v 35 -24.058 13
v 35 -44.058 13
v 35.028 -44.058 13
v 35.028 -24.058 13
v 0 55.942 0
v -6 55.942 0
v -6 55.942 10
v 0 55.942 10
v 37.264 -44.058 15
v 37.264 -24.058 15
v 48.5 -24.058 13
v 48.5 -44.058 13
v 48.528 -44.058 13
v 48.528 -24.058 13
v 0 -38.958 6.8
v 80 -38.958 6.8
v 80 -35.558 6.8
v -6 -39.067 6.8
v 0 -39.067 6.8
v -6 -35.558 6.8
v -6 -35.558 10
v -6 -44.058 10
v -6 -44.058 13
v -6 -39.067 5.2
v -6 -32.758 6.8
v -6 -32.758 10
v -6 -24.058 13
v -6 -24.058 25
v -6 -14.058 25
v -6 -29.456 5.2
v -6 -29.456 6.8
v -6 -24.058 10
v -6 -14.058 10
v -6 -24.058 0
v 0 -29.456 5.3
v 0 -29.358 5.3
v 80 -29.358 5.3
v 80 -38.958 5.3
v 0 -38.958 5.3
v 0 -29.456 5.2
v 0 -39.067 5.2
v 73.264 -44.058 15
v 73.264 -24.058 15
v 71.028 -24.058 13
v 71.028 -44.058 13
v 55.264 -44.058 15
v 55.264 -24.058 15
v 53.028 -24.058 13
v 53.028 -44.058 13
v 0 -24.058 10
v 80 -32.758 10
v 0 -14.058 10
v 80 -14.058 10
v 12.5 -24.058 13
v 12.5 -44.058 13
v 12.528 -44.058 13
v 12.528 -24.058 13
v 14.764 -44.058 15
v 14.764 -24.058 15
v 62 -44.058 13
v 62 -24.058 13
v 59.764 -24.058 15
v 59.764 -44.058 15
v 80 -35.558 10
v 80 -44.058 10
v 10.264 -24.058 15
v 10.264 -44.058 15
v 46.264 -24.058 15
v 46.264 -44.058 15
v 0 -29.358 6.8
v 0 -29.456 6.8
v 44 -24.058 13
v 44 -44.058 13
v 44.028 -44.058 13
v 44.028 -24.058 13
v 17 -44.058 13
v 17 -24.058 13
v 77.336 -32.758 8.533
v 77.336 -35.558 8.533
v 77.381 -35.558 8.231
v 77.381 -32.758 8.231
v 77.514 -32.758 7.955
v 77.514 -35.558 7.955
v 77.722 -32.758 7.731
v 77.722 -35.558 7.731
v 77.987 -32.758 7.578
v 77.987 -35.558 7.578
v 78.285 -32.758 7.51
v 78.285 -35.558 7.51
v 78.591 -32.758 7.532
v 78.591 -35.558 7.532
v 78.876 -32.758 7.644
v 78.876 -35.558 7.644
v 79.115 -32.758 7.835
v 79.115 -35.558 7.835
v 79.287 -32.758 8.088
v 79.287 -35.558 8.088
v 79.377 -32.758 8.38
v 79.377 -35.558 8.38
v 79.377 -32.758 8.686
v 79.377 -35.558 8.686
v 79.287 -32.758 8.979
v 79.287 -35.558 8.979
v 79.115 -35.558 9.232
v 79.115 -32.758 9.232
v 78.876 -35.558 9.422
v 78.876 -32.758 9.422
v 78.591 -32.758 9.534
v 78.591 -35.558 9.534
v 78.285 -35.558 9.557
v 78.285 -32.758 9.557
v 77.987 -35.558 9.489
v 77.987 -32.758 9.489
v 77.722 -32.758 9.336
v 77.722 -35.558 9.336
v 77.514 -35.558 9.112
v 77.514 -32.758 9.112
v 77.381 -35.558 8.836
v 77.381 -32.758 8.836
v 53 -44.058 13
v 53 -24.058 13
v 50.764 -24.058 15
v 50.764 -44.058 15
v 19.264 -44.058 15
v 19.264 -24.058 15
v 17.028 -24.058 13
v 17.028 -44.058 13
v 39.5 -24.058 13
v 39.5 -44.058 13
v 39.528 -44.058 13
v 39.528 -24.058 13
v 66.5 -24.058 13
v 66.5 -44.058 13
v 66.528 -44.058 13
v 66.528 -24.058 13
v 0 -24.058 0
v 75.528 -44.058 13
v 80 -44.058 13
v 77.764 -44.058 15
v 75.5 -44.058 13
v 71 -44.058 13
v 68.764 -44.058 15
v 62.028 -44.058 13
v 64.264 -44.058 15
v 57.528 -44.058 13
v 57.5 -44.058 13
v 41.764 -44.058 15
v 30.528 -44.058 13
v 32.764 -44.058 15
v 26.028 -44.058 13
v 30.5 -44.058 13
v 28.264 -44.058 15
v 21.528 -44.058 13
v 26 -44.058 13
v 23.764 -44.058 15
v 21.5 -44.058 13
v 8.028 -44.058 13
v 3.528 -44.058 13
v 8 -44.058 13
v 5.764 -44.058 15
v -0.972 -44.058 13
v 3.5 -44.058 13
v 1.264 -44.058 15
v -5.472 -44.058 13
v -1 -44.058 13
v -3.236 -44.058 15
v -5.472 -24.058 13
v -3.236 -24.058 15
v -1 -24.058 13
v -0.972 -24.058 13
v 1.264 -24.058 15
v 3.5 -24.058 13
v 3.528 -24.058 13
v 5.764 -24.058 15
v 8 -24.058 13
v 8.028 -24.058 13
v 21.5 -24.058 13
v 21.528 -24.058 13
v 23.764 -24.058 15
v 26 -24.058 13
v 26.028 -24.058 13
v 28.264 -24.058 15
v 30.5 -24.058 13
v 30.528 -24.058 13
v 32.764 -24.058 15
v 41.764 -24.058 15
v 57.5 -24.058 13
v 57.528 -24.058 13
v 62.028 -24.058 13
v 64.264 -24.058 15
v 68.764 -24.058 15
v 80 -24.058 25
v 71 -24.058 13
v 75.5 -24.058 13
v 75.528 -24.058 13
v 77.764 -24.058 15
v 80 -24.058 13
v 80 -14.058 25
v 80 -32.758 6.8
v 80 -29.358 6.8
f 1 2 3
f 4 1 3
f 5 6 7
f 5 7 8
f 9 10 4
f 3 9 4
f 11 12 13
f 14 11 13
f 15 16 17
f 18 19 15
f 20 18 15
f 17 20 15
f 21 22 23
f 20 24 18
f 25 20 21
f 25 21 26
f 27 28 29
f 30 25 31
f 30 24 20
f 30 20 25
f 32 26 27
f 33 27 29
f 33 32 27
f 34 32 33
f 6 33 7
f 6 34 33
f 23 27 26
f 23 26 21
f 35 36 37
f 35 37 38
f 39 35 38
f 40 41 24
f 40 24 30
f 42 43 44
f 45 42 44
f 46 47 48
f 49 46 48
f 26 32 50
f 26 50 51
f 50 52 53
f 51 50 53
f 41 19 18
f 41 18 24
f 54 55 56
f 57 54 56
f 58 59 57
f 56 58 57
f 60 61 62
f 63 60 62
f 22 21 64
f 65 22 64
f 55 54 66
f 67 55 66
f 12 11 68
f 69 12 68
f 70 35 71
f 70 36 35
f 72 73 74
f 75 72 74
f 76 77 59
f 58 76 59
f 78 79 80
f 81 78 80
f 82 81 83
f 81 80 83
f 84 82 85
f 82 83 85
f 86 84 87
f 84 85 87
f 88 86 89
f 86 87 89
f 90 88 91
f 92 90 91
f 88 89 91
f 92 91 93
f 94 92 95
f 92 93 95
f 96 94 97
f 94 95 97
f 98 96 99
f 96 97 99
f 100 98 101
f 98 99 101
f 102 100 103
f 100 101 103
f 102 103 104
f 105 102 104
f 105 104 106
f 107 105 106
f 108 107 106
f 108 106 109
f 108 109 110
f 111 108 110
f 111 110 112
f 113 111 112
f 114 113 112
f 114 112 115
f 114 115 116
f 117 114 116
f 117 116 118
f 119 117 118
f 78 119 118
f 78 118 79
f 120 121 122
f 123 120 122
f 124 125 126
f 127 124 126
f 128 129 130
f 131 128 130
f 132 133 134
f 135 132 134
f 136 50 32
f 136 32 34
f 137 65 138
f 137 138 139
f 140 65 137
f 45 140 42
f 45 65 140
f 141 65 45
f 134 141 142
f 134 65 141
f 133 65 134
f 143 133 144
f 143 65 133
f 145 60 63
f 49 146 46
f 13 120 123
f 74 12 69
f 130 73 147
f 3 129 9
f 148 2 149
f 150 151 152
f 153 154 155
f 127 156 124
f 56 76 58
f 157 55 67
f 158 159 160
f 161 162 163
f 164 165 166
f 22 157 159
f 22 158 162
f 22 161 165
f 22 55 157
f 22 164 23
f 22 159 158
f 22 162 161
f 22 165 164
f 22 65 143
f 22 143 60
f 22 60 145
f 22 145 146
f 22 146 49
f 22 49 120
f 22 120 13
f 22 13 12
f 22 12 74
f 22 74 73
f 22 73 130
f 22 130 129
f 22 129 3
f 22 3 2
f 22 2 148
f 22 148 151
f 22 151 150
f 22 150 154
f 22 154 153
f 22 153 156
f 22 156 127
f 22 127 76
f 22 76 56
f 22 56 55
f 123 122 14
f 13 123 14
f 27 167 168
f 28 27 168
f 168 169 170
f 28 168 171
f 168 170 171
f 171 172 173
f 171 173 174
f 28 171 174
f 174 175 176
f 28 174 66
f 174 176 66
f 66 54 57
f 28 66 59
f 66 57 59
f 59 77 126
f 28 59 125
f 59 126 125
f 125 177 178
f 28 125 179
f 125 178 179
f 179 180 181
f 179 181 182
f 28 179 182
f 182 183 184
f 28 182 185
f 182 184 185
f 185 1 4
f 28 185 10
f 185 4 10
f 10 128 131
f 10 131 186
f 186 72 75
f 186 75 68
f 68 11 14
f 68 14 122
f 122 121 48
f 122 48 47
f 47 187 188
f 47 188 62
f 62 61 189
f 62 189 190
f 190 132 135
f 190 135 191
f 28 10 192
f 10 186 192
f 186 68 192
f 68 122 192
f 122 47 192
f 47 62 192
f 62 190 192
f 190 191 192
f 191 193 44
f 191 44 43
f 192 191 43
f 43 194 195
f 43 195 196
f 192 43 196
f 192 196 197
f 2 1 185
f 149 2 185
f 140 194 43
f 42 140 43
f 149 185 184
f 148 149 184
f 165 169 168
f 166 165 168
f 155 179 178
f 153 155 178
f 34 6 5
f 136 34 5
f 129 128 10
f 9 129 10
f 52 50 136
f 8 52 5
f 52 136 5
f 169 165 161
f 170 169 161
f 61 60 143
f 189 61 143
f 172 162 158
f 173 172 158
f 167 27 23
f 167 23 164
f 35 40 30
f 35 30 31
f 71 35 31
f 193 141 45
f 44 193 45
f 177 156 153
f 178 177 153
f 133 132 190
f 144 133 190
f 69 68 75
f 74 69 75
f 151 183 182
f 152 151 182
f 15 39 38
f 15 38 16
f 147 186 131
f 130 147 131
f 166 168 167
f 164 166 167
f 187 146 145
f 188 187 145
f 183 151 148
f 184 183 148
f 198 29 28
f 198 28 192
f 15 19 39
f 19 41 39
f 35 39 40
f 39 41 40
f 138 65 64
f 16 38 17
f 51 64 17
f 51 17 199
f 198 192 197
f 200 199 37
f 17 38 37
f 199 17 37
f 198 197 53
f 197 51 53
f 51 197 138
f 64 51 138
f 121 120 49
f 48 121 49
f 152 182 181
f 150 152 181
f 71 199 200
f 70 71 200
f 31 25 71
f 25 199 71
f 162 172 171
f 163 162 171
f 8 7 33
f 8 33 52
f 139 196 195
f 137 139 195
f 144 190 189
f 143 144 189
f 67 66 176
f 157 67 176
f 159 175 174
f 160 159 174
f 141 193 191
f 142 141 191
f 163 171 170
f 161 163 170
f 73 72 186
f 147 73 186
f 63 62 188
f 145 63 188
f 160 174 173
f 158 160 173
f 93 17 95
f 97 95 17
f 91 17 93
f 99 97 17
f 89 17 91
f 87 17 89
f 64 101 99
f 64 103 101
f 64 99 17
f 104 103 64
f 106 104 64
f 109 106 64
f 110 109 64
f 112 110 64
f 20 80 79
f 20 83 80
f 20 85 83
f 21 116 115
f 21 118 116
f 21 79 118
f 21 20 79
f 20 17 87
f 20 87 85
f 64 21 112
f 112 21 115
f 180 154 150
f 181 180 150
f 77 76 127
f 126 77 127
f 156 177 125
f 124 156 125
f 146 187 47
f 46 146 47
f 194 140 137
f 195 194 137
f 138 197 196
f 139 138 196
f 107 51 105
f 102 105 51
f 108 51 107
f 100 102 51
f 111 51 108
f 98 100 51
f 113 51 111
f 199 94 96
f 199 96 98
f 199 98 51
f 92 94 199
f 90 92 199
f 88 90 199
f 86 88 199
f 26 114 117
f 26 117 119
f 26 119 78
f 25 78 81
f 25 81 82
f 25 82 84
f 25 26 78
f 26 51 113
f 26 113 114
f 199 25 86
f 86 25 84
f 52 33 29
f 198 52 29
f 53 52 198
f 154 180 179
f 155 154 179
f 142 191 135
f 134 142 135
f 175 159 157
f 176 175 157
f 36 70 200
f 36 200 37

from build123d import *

# Parameters (mm, degrees)
SKETCH4_W           = 6
SKETCH4_H           = 100
BOSS_EXTRUDE2_DEPTH = 10
BOSS_EXTRUDE3_DEPTH = 80
SKETCH6_W           = 86
SKETCH6_H           = 20
BOSS_EXTRUDE4_DEPTH = 3
SKETCH7_R           = 1.026650489
CUT_EXTRUDE2_DEPTH  = 10
BOSS_EXTRUDE6_DEPTH = 20
CUT_EXTRUDE3_DEPTH  = 10
SKETCH11_W          = 86
SKETCH11_H          = 10
BOSS_EXTRUDE7_DEPTH = 15


with BuildPart() as part:
    # Sketch4 → Boss-Extrude2 (new body)
    with BuildSketch(Plane.XY):
        with Locations((-3, 5.941704036)):
            Rectangle(SKETCH4_W, SKETCH4_H)
    extrude(amount=BOSS_EXTRUDE2_DEPTH)

    # Sketch5 → Boss-Extrude3 (add)
    with BuildSketch(Plane(origin=(0, 0, 0), x_dir=(0, 0, -1), z_dir=(1, 0, 0))):
        Polygon((-10, -32.758295964), (-6.8, -32.758295964), (-6.8, -29.358295964), (-5.3, -29.358295964), (-5.3, -38.958295964), (-6.8, -38.958295964), (-6.8, -35.558295964), (-10, -35.558295964), align=None)
    extrude(amount=BOSS_EXTRUDE3_DEPTH)

    # Sketch6 → Boss-Extrude4 (add)
    with BuildSketch(Plane.XY.offset(10)):
        with Locations((37, -34.058295964)):
            Rectangle(SKETCH6_W, SKETCH6_H)
    extrude(amount=BOSS_EXTRUDE4_DEPTH)

    # Sketch7 → Cut-Extrude2 (cut)
    with BuildSketch(Plane(origin=(0, -35.558295964, 0), x_dir=(-1, 0, 0), z_dir=(0, -1, 0))):
        with Locations((-78.362195551, -8.533372311)):
            Circle(SKETCH7_R)
    extrude(amount=-CUT_EXTRUDE2_DEPTH, mode=Mode.SUBTRACT)

    # Sketch8 → Boss-Extrude6 (add)
    with BuildSketch(Plane(origin=(0, -24.058295964, 0), x_dir=(1, 0, 0), z_dir=(0, 1, 0))):
        Polygon((80, -13), (77.763932023, -15), (75.527864045, -13), align=None)
        Polygon((75.5, -13), (73.263932023, -15), (71.027864045, -13), align=None)
        Polygon((71, -13), (68.763932023, -15), (66.527864045, -13), align=None)
        Polygon((66.5, -13), (64.263932023, -15), (62.027864045, -13), align=None)
        Polygon((62, -13), (59.763932023, -15), (57.527864045, -13), align=None)
        Polygon((57.5, -13), (55.263932023, -15), (53.027864045, -13), align=None)
        Polygon((53, -13), (50.763932023, -15), (48.527864045, -13), align=None)
        Polygon((48.5, -13), (46.263932023, -15), (44.027864045, -13), align=None)
        Polygon((44, -13), (41.763932023, -15), (39.527864045, -13), align=None)
        Polygon((39.5, -13), (37.263932023, -15), (35.027864045, -13), align=None)
        Polygon((35, -13), (32.763932023, -15), (30.527864045, -13), align=None)
        Polygon((30.5, -13), (28.263932023, -15), (26.027864045, -13), align=None)
        Polygon((26, -13), (23.763932023, -15), (21.527864045, -13), align=None)
        Polygon((21.5, -13), (19.263932023, -15), (17.027864045, -13), align=None)
        Polygon((17, -13), (14.763932023, -15), (12.527864045, -13), align=None)
        Polygon((12.5, -13), (10.263932023, -15), (8.027864045, -13), align=None)
        Polygon((8, -13), (5.763932023, -15), (3.527864045, -13), align=None)
        Polygon((3.5, -13), (1.263932023, -15), (-0.972135955, -13), align=None)
        Polygon((-1, -13), (-3.236067977, -15), (-5.472135955, -13), align=None)
    extrude(amount=-BOSS_EXTRUDE6_DEPTH)

    # Sketch9 → Cut-Extrude3 (cut)
    with BuildSketch(Plane(origin=(0, 0, 0), x_dir=(0, 0, -1), z_dir=(1, 0, 0))):
        Polygon((-10, -24.058295964), (3.159373841, -24.058295964), (3.159373841, -44.058295964), (-10, -44.058295964), (-10, -35.558295964), (-6.8, -35.558295964), (-6.8, -39.06749372), (-5.2003516, -39.06749372), (-5.2003516, -29.455913505), (-6.8, -29.455913505), (-6.8, -32.758295964), (-10, -32.758295964), align=None)
    extrude(amount=-CUT_EXTRUDE3_DEPTH, mode=Mode.SUBTRACT)

    # Sketch11 → Boss-Extrude7 (add)
    with BuildSketch(Plane.XY.offset(10)):
        with Locations((37, -19.058295964)):
            Rectangle(SKETCH11_W, SKETCH11_H)
    extrude(amount=BOSS_EXTRUDE7_DEPTH)


solid = part.part
